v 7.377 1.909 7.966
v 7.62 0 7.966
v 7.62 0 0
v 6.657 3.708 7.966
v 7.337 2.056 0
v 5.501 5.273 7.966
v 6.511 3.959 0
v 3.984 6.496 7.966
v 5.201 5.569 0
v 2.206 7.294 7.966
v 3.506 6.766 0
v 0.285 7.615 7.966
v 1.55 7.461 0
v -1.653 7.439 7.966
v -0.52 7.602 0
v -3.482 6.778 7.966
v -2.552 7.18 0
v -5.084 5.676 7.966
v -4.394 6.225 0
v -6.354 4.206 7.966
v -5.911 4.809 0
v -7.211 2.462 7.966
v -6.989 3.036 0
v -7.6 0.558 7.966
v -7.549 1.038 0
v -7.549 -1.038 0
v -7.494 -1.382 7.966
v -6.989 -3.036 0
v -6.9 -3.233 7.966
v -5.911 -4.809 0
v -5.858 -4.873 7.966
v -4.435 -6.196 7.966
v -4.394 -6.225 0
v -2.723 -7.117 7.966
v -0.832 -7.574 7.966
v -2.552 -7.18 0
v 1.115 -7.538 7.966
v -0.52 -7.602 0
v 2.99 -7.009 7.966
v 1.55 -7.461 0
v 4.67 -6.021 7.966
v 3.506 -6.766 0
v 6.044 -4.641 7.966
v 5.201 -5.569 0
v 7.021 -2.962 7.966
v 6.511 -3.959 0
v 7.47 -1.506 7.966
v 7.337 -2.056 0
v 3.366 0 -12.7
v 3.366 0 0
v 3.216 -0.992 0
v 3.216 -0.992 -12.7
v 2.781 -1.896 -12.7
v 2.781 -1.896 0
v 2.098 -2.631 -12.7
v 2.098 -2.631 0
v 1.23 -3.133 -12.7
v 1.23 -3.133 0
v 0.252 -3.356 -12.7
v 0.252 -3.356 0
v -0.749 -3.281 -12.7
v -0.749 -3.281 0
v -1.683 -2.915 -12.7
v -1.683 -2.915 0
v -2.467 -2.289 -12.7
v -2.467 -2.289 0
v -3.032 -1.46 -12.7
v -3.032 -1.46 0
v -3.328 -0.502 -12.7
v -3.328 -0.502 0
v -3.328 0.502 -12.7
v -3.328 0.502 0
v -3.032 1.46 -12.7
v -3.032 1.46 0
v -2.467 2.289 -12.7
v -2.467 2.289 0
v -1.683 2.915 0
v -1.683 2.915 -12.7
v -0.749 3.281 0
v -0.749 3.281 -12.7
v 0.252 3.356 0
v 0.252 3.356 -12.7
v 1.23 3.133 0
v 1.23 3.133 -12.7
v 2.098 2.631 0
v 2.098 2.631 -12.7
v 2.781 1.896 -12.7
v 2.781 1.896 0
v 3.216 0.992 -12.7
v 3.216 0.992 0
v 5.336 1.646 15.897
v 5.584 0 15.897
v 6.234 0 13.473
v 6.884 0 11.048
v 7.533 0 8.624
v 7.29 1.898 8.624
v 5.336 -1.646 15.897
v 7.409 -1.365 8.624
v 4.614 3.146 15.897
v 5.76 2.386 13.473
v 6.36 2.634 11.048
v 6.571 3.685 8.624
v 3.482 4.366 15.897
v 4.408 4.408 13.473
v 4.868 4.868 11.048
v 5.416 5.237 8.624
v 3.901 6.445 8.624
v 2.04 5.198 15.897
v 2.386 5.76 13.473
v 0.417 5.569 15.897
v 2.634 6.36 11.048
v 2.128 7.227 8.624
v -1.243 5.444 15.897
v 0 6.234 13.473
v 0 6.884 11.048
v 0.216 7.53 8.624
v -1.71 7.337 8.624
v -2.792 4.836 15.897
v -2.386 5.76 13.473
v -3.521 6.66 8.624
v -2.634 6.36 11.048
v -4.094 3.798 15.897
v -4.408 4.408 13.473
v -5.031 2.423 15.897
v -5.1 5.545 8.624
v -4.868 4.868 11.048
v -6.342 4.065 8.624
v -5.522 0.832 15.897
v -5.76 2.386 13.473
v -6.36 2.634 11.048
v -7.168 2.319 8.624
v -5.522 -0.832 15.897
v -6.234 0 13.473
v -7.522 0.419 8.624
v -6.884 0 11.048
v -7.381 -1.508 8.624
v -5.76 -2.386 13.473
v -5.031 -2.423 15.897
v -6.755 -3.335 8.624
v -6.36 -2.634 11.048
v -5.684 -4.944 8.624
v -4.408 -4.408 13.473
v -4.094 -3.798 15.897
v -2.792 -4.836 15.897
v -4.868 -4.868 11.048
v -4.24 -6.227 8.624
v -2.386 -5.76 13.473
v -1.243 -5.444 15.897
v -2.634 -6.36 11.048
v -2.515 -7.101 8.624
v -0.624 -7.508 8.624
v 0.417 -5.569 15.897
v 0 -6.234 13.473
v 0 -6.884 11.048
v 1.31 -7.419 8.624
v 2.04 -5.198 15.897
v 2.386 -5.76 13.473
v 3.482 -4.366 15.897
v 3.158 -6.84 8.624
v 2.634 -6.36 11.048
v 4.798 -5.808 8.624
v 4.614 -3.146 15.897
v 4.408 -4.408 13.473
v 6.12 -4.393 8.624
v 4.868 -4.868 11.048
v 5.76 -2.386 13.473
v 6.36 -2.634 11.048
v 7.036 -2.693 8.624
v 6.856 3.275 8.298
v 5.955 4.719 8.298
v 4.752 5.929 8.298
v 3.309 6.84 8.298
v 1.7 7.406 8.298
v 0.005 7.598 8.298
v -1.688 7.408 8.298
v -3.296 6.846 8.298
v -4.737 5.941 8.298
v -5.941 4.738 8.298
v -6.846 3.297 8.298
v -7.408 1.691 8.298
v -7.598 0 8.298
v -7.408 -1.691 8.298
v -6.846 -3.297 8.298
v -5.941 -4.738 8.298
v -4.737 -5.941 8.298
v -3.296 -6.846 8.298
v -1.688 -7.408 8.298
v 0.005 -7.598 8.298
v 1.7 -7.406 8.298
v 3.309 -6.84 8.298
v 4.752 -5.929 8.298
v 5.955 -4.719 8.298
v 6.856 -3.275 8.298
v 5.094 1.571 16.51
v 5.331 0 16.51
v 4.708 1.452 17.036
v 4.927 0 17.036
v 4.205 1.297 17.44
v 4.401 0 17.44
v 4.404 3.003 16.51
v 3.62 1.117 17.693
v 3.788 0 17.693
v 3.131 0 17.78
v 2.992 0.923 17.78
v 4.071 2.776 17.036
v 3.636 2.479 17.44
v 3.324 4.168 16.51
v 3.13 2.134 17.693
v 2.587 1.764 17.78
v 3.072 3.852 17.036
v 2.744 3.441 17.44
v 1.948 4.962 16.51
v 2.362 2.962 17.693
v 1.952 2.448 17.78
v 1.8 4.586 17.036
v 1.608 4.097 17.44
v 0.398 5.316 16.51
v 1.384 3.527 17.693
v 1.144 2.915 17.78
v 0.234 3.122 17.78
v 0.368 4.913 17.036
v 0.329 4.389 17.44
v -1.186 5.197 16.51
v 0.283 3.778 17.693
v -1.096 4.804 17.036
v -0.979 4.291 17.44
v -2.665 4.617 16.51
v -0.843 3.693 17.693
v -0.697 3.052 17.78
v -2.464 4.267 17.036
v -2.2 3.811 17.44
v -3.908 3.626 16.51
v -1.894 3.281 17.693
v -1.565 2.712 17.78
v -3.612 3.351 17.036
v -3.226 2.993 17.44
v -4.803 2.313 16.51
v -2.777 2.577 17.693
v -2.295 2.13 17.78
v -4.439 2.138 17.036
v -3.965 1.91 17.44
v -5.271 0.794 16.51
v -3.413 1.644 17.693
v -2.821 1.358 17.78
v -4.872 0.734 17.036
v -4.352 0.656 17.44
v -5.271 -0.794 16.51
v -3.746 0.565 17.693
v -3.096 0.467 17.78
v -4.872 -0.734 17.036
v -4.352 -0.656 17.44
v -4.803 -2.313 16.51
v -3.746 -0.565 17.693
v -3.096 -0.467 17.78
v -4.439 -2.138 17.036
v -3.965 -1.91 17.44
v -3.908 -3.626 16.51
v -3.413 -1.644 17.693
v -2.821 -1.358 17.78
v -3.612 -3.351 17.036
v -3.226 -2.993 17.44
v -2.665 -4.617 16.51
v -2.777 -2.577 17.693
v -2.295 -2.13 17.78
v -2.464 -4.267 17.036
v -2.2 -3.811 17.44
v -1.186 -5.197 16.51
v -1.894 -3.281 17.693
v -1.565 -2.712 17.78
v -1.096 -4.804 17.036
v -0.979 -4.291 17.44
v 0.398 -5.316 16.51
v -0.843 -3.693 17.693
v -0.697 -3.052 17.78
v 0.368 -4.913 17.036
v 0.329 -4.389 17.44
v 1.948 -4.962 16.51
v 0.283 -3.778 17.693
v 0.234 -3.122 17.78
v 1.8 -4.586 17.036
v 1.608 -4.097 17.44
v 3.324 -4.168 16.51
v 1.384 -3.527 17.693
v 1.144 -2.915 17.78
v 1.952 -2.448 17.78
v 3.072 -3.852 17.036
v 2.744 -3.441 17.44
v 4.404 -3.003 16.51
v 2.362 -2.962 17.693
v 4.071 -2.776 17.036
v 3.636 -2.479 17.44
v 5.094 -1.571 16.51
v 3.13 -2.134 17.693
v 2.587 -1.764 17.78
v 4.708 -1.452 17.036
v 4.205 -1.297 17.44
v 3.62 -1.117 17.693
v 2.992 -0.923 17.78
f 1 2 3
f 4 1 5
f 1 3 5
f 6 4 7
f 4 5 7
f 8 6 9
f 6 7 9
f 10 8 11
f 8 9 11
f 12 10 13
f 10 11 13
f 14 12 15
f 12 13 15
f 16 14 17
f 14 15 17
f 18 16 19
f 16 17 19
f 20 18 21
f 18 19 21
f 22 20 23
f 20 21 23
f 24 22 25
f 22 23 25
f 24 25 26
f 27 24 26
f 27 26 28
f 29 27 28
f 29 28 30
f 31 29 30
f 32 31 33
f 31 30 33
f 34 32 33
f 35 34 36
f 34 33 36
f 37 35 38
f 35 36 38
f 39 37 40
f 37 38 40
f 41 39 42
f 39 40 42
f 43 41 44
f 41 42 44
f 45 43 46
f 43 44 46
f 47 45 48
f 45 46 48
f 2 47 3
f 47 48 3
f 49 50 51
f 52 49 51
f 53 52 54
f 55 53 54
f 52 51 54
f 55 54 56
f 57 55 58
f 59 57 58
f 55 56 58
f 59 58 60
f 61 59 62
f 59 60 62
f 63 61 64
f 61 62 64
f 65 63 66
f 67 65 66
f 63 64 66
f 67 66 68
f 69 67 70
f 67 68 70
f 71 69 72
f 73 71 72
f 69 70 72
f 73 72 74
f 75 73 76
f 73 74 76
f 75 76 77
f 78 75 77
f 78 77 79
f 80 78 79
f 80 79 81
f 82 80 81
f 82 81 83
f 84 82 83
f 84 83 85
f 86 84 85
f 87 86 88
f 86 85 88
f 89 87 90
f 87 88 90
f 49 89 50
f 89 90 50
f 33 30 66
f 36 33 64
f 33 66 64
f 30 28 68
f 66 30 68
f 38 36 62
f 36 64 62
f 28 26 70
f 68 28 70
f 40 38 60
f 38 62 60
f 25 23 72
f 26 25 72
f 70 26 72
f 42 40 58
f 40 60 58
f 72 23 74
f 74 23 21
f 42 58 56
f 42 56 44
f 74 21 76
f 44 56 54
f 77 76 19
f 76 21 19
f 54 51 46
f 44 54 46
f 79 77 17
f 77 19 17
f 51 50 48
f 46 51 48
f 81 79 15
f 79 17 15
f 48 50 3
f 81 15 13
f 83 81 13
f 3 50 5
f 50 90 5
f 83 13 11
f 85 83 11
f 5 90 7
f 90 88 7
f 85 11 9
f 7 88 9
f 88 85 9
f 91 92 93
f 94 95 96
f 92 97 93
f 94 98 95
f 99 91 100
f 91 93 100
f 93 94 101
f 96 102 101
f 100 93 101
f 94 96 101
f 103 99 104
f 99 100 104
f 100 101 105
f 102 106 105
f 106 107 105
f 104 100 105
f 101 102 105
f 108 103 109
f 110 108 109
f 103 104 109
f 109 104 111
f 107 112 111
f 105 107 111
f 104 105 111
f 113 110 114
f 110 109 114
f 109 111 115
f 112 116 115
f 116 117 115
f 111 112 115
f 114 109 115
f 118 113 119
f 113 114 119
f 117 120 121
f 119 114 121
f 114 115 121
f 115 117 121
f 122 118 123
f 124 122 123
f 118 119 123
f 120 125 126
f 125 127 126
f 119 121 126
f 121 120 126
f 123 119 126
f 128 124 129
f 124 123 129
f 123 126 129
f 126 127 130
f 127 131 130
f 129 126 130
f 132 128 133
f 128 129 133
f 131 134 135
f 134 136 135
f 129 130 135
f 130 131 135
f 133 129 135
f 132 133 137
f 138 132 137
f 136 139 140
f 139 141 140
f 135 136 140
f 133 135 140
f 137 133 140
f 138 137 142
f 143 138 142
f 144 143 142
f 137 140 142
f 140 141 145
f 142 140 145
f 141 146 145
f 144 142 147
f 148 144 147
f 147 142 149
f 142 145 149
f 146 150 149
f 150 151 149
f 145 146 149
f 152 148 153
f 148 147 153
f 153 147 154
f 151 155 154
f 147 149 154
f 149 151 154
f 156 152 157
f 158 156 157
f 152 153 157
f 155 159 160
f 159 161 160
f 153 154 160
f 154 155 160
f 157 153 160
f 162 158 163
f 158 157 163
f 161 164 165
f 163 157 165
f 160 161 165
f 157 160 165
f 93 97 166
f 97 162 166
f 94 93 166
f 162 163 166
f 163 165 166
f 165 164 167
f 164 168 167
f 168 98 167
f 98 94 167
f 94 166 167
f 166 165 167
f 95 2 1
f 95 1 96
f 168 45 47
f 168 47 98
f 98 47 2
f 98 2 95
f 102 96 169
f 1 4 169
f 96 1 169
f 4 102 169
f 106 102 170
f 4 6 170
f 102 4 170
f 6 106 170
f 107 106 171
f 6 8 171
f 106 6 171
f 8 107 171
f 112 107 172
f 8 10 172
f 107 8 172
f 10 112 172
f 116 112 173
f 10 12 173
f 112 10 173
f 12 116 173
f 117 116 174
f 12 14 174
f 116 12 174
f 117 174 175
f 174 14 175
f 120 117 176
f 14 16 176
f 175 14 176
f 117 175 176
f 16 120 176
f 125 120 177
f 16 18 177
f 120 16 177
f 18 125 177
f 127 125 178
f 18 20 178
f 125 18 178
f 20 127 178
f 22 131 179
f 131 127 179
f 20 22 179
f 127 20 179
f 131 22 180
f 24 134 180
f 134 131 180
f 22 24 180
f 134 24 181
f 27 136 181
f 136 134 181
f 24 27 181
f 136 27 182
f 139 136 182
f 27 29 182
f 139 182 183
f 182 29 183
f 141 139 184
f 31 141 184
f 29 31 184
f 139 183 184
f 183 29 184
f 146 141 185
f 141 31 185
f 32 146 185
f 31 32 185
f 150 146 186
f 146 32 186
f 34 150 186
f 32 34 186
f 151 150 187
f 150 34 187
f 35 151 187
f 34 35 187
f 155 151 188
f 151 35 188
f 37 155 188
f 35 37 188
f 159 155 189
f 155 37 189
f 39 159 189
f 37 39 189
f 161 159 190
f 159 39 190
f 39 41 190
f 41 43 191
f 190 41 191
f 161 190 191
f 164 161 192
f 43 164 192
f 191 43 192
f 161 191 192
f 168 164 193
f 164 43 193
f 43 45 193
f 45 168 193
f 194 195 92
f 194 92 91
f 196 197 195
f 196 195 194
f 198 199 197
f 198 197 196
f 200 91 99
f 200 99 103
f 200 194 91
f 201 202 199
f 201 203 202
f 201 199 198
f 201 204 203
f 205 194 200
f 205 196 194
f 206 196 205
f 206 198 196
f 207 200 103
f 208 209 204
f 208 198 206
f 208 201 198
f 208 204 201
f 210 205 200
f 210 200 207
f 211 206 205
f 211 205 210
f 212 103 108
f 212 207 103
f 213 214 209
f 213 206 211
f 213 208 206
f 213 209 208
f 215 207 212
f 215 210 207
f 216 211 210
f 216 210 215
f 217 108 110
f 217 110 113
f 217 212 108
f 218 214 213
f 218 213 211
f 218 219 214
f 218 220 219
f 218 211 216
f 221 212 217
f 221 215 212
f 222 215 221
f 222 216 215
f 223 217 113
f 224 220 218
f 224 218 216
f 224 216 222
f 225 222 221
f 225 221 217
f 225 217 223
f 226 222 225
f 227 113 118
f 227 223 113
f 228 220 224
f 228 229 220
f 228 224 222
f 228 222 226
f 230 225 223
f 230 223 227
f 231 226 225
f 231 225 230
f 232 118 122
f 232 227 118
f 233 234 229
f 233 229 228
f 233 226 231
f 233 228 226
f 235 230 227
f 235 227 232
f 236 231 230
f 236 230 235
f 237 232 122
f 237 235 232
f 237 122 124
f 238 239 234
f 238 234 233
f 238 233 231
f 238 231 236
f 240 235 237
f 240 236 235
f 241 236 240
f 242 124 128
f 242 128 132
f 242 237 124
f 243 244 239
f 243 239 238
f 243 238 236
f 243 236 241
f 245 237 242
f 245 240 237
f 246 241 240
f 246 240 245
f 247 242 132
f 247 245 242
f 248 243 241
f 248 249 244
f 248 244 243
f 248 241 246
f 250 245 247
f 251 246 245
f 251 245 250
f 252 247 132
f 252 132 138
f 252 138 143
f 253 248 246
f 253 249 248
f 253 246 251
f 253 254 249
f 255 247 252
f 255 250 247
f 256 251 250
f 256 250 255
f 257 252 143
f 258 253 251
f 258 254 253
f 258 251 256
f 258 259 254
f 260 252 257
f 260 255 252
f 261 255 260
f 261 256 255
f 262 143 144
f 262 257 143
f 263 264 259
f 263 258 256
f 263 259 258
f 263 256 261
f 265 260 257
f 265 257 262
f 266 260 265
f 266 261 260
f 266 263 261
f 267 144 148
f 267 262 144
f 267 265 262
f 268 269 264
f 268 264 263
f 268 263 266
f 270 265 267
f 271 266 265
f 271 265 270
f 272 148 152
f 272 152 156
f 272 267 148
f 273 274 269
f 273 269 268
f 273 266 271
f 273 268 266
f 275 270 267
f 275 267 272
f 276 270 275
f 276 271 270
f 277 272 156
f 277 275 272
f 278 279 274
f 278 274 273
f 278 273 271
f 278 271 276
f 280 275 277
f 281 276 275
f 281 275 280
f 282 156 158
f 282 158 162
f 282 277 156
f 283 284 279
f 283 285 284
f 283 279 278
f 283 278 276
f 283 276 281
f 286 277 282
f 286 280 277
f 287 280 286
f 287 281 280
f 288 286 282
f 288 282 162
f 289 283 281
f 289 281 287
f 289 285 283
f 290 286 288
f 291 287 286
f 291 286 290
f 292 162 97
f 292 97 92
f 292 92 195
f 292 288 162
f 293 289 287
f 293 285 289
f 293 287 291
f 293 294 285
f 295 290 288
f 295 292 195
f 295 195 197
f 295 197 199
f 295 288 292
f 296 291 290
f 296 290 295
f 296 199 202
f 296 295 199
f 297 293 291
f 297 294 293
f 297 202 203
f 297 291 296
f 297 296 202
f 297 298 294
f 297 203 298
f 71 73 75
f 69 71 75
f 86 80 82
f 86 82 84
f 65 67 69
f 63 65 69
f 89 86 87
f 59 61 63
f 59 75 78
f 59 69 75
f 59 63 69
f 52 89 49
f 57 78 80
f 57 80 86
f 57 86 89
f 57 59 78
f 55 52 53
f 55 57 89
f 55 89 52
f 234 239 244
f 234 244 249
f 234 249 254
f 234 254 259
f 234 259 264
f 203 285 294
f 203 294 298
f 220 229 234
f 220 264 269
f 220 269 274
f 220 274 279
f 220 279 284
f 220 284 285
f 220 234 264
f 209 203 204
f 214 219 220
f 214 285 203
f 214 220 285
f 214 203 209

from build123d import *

# Parameters (mm, degrees)
F0_R     = 7.62
F1_DEPTH = 17.78
F2_SIZE2 = 9.4794090512
F2_SIZE  = 2.54
F3_R     = 2.54
F4_R     = 3.3655
F5_DEPTH = 12.7


with BuildPart() as f1:
    # F0 (on Top) → F1 (new body)
    with BuildSketch(Plane.XY):
        Circle(F0_R)
    extrude(amount=F1_DEPTH)

    # F2
    f2_edges = [f1.edges().sort_by_distance(p)[0] for p in [
        (-7.62, 0, 17.78),
    ]]
    f2_side = f1.faces().sort_by_distance((0, 0, 17.78))[0]
    chamfer(f2_edges, length=F2_SIZE, length2=F2_SIZE2, reference=f2_side)

    # F3
    f3_edges = [f1.edges().sort_by_distance(p)[0] for p in [
        (-5.08, 0, 17.78),
        (-7.62, 0, 8.300591),
    ]]
    fillet(f3_edges, radius=F3_R)

    # F4 (on face) → F5 (join)
    with BuildSketch(Plane(origin=(0, 0, 0), x_dir=(1, 0, 0), z_dir=(0, 0, -1))):
        Circle(F4_R)
    extrude(amount=F5_DEPTH)


solid = f1.part
